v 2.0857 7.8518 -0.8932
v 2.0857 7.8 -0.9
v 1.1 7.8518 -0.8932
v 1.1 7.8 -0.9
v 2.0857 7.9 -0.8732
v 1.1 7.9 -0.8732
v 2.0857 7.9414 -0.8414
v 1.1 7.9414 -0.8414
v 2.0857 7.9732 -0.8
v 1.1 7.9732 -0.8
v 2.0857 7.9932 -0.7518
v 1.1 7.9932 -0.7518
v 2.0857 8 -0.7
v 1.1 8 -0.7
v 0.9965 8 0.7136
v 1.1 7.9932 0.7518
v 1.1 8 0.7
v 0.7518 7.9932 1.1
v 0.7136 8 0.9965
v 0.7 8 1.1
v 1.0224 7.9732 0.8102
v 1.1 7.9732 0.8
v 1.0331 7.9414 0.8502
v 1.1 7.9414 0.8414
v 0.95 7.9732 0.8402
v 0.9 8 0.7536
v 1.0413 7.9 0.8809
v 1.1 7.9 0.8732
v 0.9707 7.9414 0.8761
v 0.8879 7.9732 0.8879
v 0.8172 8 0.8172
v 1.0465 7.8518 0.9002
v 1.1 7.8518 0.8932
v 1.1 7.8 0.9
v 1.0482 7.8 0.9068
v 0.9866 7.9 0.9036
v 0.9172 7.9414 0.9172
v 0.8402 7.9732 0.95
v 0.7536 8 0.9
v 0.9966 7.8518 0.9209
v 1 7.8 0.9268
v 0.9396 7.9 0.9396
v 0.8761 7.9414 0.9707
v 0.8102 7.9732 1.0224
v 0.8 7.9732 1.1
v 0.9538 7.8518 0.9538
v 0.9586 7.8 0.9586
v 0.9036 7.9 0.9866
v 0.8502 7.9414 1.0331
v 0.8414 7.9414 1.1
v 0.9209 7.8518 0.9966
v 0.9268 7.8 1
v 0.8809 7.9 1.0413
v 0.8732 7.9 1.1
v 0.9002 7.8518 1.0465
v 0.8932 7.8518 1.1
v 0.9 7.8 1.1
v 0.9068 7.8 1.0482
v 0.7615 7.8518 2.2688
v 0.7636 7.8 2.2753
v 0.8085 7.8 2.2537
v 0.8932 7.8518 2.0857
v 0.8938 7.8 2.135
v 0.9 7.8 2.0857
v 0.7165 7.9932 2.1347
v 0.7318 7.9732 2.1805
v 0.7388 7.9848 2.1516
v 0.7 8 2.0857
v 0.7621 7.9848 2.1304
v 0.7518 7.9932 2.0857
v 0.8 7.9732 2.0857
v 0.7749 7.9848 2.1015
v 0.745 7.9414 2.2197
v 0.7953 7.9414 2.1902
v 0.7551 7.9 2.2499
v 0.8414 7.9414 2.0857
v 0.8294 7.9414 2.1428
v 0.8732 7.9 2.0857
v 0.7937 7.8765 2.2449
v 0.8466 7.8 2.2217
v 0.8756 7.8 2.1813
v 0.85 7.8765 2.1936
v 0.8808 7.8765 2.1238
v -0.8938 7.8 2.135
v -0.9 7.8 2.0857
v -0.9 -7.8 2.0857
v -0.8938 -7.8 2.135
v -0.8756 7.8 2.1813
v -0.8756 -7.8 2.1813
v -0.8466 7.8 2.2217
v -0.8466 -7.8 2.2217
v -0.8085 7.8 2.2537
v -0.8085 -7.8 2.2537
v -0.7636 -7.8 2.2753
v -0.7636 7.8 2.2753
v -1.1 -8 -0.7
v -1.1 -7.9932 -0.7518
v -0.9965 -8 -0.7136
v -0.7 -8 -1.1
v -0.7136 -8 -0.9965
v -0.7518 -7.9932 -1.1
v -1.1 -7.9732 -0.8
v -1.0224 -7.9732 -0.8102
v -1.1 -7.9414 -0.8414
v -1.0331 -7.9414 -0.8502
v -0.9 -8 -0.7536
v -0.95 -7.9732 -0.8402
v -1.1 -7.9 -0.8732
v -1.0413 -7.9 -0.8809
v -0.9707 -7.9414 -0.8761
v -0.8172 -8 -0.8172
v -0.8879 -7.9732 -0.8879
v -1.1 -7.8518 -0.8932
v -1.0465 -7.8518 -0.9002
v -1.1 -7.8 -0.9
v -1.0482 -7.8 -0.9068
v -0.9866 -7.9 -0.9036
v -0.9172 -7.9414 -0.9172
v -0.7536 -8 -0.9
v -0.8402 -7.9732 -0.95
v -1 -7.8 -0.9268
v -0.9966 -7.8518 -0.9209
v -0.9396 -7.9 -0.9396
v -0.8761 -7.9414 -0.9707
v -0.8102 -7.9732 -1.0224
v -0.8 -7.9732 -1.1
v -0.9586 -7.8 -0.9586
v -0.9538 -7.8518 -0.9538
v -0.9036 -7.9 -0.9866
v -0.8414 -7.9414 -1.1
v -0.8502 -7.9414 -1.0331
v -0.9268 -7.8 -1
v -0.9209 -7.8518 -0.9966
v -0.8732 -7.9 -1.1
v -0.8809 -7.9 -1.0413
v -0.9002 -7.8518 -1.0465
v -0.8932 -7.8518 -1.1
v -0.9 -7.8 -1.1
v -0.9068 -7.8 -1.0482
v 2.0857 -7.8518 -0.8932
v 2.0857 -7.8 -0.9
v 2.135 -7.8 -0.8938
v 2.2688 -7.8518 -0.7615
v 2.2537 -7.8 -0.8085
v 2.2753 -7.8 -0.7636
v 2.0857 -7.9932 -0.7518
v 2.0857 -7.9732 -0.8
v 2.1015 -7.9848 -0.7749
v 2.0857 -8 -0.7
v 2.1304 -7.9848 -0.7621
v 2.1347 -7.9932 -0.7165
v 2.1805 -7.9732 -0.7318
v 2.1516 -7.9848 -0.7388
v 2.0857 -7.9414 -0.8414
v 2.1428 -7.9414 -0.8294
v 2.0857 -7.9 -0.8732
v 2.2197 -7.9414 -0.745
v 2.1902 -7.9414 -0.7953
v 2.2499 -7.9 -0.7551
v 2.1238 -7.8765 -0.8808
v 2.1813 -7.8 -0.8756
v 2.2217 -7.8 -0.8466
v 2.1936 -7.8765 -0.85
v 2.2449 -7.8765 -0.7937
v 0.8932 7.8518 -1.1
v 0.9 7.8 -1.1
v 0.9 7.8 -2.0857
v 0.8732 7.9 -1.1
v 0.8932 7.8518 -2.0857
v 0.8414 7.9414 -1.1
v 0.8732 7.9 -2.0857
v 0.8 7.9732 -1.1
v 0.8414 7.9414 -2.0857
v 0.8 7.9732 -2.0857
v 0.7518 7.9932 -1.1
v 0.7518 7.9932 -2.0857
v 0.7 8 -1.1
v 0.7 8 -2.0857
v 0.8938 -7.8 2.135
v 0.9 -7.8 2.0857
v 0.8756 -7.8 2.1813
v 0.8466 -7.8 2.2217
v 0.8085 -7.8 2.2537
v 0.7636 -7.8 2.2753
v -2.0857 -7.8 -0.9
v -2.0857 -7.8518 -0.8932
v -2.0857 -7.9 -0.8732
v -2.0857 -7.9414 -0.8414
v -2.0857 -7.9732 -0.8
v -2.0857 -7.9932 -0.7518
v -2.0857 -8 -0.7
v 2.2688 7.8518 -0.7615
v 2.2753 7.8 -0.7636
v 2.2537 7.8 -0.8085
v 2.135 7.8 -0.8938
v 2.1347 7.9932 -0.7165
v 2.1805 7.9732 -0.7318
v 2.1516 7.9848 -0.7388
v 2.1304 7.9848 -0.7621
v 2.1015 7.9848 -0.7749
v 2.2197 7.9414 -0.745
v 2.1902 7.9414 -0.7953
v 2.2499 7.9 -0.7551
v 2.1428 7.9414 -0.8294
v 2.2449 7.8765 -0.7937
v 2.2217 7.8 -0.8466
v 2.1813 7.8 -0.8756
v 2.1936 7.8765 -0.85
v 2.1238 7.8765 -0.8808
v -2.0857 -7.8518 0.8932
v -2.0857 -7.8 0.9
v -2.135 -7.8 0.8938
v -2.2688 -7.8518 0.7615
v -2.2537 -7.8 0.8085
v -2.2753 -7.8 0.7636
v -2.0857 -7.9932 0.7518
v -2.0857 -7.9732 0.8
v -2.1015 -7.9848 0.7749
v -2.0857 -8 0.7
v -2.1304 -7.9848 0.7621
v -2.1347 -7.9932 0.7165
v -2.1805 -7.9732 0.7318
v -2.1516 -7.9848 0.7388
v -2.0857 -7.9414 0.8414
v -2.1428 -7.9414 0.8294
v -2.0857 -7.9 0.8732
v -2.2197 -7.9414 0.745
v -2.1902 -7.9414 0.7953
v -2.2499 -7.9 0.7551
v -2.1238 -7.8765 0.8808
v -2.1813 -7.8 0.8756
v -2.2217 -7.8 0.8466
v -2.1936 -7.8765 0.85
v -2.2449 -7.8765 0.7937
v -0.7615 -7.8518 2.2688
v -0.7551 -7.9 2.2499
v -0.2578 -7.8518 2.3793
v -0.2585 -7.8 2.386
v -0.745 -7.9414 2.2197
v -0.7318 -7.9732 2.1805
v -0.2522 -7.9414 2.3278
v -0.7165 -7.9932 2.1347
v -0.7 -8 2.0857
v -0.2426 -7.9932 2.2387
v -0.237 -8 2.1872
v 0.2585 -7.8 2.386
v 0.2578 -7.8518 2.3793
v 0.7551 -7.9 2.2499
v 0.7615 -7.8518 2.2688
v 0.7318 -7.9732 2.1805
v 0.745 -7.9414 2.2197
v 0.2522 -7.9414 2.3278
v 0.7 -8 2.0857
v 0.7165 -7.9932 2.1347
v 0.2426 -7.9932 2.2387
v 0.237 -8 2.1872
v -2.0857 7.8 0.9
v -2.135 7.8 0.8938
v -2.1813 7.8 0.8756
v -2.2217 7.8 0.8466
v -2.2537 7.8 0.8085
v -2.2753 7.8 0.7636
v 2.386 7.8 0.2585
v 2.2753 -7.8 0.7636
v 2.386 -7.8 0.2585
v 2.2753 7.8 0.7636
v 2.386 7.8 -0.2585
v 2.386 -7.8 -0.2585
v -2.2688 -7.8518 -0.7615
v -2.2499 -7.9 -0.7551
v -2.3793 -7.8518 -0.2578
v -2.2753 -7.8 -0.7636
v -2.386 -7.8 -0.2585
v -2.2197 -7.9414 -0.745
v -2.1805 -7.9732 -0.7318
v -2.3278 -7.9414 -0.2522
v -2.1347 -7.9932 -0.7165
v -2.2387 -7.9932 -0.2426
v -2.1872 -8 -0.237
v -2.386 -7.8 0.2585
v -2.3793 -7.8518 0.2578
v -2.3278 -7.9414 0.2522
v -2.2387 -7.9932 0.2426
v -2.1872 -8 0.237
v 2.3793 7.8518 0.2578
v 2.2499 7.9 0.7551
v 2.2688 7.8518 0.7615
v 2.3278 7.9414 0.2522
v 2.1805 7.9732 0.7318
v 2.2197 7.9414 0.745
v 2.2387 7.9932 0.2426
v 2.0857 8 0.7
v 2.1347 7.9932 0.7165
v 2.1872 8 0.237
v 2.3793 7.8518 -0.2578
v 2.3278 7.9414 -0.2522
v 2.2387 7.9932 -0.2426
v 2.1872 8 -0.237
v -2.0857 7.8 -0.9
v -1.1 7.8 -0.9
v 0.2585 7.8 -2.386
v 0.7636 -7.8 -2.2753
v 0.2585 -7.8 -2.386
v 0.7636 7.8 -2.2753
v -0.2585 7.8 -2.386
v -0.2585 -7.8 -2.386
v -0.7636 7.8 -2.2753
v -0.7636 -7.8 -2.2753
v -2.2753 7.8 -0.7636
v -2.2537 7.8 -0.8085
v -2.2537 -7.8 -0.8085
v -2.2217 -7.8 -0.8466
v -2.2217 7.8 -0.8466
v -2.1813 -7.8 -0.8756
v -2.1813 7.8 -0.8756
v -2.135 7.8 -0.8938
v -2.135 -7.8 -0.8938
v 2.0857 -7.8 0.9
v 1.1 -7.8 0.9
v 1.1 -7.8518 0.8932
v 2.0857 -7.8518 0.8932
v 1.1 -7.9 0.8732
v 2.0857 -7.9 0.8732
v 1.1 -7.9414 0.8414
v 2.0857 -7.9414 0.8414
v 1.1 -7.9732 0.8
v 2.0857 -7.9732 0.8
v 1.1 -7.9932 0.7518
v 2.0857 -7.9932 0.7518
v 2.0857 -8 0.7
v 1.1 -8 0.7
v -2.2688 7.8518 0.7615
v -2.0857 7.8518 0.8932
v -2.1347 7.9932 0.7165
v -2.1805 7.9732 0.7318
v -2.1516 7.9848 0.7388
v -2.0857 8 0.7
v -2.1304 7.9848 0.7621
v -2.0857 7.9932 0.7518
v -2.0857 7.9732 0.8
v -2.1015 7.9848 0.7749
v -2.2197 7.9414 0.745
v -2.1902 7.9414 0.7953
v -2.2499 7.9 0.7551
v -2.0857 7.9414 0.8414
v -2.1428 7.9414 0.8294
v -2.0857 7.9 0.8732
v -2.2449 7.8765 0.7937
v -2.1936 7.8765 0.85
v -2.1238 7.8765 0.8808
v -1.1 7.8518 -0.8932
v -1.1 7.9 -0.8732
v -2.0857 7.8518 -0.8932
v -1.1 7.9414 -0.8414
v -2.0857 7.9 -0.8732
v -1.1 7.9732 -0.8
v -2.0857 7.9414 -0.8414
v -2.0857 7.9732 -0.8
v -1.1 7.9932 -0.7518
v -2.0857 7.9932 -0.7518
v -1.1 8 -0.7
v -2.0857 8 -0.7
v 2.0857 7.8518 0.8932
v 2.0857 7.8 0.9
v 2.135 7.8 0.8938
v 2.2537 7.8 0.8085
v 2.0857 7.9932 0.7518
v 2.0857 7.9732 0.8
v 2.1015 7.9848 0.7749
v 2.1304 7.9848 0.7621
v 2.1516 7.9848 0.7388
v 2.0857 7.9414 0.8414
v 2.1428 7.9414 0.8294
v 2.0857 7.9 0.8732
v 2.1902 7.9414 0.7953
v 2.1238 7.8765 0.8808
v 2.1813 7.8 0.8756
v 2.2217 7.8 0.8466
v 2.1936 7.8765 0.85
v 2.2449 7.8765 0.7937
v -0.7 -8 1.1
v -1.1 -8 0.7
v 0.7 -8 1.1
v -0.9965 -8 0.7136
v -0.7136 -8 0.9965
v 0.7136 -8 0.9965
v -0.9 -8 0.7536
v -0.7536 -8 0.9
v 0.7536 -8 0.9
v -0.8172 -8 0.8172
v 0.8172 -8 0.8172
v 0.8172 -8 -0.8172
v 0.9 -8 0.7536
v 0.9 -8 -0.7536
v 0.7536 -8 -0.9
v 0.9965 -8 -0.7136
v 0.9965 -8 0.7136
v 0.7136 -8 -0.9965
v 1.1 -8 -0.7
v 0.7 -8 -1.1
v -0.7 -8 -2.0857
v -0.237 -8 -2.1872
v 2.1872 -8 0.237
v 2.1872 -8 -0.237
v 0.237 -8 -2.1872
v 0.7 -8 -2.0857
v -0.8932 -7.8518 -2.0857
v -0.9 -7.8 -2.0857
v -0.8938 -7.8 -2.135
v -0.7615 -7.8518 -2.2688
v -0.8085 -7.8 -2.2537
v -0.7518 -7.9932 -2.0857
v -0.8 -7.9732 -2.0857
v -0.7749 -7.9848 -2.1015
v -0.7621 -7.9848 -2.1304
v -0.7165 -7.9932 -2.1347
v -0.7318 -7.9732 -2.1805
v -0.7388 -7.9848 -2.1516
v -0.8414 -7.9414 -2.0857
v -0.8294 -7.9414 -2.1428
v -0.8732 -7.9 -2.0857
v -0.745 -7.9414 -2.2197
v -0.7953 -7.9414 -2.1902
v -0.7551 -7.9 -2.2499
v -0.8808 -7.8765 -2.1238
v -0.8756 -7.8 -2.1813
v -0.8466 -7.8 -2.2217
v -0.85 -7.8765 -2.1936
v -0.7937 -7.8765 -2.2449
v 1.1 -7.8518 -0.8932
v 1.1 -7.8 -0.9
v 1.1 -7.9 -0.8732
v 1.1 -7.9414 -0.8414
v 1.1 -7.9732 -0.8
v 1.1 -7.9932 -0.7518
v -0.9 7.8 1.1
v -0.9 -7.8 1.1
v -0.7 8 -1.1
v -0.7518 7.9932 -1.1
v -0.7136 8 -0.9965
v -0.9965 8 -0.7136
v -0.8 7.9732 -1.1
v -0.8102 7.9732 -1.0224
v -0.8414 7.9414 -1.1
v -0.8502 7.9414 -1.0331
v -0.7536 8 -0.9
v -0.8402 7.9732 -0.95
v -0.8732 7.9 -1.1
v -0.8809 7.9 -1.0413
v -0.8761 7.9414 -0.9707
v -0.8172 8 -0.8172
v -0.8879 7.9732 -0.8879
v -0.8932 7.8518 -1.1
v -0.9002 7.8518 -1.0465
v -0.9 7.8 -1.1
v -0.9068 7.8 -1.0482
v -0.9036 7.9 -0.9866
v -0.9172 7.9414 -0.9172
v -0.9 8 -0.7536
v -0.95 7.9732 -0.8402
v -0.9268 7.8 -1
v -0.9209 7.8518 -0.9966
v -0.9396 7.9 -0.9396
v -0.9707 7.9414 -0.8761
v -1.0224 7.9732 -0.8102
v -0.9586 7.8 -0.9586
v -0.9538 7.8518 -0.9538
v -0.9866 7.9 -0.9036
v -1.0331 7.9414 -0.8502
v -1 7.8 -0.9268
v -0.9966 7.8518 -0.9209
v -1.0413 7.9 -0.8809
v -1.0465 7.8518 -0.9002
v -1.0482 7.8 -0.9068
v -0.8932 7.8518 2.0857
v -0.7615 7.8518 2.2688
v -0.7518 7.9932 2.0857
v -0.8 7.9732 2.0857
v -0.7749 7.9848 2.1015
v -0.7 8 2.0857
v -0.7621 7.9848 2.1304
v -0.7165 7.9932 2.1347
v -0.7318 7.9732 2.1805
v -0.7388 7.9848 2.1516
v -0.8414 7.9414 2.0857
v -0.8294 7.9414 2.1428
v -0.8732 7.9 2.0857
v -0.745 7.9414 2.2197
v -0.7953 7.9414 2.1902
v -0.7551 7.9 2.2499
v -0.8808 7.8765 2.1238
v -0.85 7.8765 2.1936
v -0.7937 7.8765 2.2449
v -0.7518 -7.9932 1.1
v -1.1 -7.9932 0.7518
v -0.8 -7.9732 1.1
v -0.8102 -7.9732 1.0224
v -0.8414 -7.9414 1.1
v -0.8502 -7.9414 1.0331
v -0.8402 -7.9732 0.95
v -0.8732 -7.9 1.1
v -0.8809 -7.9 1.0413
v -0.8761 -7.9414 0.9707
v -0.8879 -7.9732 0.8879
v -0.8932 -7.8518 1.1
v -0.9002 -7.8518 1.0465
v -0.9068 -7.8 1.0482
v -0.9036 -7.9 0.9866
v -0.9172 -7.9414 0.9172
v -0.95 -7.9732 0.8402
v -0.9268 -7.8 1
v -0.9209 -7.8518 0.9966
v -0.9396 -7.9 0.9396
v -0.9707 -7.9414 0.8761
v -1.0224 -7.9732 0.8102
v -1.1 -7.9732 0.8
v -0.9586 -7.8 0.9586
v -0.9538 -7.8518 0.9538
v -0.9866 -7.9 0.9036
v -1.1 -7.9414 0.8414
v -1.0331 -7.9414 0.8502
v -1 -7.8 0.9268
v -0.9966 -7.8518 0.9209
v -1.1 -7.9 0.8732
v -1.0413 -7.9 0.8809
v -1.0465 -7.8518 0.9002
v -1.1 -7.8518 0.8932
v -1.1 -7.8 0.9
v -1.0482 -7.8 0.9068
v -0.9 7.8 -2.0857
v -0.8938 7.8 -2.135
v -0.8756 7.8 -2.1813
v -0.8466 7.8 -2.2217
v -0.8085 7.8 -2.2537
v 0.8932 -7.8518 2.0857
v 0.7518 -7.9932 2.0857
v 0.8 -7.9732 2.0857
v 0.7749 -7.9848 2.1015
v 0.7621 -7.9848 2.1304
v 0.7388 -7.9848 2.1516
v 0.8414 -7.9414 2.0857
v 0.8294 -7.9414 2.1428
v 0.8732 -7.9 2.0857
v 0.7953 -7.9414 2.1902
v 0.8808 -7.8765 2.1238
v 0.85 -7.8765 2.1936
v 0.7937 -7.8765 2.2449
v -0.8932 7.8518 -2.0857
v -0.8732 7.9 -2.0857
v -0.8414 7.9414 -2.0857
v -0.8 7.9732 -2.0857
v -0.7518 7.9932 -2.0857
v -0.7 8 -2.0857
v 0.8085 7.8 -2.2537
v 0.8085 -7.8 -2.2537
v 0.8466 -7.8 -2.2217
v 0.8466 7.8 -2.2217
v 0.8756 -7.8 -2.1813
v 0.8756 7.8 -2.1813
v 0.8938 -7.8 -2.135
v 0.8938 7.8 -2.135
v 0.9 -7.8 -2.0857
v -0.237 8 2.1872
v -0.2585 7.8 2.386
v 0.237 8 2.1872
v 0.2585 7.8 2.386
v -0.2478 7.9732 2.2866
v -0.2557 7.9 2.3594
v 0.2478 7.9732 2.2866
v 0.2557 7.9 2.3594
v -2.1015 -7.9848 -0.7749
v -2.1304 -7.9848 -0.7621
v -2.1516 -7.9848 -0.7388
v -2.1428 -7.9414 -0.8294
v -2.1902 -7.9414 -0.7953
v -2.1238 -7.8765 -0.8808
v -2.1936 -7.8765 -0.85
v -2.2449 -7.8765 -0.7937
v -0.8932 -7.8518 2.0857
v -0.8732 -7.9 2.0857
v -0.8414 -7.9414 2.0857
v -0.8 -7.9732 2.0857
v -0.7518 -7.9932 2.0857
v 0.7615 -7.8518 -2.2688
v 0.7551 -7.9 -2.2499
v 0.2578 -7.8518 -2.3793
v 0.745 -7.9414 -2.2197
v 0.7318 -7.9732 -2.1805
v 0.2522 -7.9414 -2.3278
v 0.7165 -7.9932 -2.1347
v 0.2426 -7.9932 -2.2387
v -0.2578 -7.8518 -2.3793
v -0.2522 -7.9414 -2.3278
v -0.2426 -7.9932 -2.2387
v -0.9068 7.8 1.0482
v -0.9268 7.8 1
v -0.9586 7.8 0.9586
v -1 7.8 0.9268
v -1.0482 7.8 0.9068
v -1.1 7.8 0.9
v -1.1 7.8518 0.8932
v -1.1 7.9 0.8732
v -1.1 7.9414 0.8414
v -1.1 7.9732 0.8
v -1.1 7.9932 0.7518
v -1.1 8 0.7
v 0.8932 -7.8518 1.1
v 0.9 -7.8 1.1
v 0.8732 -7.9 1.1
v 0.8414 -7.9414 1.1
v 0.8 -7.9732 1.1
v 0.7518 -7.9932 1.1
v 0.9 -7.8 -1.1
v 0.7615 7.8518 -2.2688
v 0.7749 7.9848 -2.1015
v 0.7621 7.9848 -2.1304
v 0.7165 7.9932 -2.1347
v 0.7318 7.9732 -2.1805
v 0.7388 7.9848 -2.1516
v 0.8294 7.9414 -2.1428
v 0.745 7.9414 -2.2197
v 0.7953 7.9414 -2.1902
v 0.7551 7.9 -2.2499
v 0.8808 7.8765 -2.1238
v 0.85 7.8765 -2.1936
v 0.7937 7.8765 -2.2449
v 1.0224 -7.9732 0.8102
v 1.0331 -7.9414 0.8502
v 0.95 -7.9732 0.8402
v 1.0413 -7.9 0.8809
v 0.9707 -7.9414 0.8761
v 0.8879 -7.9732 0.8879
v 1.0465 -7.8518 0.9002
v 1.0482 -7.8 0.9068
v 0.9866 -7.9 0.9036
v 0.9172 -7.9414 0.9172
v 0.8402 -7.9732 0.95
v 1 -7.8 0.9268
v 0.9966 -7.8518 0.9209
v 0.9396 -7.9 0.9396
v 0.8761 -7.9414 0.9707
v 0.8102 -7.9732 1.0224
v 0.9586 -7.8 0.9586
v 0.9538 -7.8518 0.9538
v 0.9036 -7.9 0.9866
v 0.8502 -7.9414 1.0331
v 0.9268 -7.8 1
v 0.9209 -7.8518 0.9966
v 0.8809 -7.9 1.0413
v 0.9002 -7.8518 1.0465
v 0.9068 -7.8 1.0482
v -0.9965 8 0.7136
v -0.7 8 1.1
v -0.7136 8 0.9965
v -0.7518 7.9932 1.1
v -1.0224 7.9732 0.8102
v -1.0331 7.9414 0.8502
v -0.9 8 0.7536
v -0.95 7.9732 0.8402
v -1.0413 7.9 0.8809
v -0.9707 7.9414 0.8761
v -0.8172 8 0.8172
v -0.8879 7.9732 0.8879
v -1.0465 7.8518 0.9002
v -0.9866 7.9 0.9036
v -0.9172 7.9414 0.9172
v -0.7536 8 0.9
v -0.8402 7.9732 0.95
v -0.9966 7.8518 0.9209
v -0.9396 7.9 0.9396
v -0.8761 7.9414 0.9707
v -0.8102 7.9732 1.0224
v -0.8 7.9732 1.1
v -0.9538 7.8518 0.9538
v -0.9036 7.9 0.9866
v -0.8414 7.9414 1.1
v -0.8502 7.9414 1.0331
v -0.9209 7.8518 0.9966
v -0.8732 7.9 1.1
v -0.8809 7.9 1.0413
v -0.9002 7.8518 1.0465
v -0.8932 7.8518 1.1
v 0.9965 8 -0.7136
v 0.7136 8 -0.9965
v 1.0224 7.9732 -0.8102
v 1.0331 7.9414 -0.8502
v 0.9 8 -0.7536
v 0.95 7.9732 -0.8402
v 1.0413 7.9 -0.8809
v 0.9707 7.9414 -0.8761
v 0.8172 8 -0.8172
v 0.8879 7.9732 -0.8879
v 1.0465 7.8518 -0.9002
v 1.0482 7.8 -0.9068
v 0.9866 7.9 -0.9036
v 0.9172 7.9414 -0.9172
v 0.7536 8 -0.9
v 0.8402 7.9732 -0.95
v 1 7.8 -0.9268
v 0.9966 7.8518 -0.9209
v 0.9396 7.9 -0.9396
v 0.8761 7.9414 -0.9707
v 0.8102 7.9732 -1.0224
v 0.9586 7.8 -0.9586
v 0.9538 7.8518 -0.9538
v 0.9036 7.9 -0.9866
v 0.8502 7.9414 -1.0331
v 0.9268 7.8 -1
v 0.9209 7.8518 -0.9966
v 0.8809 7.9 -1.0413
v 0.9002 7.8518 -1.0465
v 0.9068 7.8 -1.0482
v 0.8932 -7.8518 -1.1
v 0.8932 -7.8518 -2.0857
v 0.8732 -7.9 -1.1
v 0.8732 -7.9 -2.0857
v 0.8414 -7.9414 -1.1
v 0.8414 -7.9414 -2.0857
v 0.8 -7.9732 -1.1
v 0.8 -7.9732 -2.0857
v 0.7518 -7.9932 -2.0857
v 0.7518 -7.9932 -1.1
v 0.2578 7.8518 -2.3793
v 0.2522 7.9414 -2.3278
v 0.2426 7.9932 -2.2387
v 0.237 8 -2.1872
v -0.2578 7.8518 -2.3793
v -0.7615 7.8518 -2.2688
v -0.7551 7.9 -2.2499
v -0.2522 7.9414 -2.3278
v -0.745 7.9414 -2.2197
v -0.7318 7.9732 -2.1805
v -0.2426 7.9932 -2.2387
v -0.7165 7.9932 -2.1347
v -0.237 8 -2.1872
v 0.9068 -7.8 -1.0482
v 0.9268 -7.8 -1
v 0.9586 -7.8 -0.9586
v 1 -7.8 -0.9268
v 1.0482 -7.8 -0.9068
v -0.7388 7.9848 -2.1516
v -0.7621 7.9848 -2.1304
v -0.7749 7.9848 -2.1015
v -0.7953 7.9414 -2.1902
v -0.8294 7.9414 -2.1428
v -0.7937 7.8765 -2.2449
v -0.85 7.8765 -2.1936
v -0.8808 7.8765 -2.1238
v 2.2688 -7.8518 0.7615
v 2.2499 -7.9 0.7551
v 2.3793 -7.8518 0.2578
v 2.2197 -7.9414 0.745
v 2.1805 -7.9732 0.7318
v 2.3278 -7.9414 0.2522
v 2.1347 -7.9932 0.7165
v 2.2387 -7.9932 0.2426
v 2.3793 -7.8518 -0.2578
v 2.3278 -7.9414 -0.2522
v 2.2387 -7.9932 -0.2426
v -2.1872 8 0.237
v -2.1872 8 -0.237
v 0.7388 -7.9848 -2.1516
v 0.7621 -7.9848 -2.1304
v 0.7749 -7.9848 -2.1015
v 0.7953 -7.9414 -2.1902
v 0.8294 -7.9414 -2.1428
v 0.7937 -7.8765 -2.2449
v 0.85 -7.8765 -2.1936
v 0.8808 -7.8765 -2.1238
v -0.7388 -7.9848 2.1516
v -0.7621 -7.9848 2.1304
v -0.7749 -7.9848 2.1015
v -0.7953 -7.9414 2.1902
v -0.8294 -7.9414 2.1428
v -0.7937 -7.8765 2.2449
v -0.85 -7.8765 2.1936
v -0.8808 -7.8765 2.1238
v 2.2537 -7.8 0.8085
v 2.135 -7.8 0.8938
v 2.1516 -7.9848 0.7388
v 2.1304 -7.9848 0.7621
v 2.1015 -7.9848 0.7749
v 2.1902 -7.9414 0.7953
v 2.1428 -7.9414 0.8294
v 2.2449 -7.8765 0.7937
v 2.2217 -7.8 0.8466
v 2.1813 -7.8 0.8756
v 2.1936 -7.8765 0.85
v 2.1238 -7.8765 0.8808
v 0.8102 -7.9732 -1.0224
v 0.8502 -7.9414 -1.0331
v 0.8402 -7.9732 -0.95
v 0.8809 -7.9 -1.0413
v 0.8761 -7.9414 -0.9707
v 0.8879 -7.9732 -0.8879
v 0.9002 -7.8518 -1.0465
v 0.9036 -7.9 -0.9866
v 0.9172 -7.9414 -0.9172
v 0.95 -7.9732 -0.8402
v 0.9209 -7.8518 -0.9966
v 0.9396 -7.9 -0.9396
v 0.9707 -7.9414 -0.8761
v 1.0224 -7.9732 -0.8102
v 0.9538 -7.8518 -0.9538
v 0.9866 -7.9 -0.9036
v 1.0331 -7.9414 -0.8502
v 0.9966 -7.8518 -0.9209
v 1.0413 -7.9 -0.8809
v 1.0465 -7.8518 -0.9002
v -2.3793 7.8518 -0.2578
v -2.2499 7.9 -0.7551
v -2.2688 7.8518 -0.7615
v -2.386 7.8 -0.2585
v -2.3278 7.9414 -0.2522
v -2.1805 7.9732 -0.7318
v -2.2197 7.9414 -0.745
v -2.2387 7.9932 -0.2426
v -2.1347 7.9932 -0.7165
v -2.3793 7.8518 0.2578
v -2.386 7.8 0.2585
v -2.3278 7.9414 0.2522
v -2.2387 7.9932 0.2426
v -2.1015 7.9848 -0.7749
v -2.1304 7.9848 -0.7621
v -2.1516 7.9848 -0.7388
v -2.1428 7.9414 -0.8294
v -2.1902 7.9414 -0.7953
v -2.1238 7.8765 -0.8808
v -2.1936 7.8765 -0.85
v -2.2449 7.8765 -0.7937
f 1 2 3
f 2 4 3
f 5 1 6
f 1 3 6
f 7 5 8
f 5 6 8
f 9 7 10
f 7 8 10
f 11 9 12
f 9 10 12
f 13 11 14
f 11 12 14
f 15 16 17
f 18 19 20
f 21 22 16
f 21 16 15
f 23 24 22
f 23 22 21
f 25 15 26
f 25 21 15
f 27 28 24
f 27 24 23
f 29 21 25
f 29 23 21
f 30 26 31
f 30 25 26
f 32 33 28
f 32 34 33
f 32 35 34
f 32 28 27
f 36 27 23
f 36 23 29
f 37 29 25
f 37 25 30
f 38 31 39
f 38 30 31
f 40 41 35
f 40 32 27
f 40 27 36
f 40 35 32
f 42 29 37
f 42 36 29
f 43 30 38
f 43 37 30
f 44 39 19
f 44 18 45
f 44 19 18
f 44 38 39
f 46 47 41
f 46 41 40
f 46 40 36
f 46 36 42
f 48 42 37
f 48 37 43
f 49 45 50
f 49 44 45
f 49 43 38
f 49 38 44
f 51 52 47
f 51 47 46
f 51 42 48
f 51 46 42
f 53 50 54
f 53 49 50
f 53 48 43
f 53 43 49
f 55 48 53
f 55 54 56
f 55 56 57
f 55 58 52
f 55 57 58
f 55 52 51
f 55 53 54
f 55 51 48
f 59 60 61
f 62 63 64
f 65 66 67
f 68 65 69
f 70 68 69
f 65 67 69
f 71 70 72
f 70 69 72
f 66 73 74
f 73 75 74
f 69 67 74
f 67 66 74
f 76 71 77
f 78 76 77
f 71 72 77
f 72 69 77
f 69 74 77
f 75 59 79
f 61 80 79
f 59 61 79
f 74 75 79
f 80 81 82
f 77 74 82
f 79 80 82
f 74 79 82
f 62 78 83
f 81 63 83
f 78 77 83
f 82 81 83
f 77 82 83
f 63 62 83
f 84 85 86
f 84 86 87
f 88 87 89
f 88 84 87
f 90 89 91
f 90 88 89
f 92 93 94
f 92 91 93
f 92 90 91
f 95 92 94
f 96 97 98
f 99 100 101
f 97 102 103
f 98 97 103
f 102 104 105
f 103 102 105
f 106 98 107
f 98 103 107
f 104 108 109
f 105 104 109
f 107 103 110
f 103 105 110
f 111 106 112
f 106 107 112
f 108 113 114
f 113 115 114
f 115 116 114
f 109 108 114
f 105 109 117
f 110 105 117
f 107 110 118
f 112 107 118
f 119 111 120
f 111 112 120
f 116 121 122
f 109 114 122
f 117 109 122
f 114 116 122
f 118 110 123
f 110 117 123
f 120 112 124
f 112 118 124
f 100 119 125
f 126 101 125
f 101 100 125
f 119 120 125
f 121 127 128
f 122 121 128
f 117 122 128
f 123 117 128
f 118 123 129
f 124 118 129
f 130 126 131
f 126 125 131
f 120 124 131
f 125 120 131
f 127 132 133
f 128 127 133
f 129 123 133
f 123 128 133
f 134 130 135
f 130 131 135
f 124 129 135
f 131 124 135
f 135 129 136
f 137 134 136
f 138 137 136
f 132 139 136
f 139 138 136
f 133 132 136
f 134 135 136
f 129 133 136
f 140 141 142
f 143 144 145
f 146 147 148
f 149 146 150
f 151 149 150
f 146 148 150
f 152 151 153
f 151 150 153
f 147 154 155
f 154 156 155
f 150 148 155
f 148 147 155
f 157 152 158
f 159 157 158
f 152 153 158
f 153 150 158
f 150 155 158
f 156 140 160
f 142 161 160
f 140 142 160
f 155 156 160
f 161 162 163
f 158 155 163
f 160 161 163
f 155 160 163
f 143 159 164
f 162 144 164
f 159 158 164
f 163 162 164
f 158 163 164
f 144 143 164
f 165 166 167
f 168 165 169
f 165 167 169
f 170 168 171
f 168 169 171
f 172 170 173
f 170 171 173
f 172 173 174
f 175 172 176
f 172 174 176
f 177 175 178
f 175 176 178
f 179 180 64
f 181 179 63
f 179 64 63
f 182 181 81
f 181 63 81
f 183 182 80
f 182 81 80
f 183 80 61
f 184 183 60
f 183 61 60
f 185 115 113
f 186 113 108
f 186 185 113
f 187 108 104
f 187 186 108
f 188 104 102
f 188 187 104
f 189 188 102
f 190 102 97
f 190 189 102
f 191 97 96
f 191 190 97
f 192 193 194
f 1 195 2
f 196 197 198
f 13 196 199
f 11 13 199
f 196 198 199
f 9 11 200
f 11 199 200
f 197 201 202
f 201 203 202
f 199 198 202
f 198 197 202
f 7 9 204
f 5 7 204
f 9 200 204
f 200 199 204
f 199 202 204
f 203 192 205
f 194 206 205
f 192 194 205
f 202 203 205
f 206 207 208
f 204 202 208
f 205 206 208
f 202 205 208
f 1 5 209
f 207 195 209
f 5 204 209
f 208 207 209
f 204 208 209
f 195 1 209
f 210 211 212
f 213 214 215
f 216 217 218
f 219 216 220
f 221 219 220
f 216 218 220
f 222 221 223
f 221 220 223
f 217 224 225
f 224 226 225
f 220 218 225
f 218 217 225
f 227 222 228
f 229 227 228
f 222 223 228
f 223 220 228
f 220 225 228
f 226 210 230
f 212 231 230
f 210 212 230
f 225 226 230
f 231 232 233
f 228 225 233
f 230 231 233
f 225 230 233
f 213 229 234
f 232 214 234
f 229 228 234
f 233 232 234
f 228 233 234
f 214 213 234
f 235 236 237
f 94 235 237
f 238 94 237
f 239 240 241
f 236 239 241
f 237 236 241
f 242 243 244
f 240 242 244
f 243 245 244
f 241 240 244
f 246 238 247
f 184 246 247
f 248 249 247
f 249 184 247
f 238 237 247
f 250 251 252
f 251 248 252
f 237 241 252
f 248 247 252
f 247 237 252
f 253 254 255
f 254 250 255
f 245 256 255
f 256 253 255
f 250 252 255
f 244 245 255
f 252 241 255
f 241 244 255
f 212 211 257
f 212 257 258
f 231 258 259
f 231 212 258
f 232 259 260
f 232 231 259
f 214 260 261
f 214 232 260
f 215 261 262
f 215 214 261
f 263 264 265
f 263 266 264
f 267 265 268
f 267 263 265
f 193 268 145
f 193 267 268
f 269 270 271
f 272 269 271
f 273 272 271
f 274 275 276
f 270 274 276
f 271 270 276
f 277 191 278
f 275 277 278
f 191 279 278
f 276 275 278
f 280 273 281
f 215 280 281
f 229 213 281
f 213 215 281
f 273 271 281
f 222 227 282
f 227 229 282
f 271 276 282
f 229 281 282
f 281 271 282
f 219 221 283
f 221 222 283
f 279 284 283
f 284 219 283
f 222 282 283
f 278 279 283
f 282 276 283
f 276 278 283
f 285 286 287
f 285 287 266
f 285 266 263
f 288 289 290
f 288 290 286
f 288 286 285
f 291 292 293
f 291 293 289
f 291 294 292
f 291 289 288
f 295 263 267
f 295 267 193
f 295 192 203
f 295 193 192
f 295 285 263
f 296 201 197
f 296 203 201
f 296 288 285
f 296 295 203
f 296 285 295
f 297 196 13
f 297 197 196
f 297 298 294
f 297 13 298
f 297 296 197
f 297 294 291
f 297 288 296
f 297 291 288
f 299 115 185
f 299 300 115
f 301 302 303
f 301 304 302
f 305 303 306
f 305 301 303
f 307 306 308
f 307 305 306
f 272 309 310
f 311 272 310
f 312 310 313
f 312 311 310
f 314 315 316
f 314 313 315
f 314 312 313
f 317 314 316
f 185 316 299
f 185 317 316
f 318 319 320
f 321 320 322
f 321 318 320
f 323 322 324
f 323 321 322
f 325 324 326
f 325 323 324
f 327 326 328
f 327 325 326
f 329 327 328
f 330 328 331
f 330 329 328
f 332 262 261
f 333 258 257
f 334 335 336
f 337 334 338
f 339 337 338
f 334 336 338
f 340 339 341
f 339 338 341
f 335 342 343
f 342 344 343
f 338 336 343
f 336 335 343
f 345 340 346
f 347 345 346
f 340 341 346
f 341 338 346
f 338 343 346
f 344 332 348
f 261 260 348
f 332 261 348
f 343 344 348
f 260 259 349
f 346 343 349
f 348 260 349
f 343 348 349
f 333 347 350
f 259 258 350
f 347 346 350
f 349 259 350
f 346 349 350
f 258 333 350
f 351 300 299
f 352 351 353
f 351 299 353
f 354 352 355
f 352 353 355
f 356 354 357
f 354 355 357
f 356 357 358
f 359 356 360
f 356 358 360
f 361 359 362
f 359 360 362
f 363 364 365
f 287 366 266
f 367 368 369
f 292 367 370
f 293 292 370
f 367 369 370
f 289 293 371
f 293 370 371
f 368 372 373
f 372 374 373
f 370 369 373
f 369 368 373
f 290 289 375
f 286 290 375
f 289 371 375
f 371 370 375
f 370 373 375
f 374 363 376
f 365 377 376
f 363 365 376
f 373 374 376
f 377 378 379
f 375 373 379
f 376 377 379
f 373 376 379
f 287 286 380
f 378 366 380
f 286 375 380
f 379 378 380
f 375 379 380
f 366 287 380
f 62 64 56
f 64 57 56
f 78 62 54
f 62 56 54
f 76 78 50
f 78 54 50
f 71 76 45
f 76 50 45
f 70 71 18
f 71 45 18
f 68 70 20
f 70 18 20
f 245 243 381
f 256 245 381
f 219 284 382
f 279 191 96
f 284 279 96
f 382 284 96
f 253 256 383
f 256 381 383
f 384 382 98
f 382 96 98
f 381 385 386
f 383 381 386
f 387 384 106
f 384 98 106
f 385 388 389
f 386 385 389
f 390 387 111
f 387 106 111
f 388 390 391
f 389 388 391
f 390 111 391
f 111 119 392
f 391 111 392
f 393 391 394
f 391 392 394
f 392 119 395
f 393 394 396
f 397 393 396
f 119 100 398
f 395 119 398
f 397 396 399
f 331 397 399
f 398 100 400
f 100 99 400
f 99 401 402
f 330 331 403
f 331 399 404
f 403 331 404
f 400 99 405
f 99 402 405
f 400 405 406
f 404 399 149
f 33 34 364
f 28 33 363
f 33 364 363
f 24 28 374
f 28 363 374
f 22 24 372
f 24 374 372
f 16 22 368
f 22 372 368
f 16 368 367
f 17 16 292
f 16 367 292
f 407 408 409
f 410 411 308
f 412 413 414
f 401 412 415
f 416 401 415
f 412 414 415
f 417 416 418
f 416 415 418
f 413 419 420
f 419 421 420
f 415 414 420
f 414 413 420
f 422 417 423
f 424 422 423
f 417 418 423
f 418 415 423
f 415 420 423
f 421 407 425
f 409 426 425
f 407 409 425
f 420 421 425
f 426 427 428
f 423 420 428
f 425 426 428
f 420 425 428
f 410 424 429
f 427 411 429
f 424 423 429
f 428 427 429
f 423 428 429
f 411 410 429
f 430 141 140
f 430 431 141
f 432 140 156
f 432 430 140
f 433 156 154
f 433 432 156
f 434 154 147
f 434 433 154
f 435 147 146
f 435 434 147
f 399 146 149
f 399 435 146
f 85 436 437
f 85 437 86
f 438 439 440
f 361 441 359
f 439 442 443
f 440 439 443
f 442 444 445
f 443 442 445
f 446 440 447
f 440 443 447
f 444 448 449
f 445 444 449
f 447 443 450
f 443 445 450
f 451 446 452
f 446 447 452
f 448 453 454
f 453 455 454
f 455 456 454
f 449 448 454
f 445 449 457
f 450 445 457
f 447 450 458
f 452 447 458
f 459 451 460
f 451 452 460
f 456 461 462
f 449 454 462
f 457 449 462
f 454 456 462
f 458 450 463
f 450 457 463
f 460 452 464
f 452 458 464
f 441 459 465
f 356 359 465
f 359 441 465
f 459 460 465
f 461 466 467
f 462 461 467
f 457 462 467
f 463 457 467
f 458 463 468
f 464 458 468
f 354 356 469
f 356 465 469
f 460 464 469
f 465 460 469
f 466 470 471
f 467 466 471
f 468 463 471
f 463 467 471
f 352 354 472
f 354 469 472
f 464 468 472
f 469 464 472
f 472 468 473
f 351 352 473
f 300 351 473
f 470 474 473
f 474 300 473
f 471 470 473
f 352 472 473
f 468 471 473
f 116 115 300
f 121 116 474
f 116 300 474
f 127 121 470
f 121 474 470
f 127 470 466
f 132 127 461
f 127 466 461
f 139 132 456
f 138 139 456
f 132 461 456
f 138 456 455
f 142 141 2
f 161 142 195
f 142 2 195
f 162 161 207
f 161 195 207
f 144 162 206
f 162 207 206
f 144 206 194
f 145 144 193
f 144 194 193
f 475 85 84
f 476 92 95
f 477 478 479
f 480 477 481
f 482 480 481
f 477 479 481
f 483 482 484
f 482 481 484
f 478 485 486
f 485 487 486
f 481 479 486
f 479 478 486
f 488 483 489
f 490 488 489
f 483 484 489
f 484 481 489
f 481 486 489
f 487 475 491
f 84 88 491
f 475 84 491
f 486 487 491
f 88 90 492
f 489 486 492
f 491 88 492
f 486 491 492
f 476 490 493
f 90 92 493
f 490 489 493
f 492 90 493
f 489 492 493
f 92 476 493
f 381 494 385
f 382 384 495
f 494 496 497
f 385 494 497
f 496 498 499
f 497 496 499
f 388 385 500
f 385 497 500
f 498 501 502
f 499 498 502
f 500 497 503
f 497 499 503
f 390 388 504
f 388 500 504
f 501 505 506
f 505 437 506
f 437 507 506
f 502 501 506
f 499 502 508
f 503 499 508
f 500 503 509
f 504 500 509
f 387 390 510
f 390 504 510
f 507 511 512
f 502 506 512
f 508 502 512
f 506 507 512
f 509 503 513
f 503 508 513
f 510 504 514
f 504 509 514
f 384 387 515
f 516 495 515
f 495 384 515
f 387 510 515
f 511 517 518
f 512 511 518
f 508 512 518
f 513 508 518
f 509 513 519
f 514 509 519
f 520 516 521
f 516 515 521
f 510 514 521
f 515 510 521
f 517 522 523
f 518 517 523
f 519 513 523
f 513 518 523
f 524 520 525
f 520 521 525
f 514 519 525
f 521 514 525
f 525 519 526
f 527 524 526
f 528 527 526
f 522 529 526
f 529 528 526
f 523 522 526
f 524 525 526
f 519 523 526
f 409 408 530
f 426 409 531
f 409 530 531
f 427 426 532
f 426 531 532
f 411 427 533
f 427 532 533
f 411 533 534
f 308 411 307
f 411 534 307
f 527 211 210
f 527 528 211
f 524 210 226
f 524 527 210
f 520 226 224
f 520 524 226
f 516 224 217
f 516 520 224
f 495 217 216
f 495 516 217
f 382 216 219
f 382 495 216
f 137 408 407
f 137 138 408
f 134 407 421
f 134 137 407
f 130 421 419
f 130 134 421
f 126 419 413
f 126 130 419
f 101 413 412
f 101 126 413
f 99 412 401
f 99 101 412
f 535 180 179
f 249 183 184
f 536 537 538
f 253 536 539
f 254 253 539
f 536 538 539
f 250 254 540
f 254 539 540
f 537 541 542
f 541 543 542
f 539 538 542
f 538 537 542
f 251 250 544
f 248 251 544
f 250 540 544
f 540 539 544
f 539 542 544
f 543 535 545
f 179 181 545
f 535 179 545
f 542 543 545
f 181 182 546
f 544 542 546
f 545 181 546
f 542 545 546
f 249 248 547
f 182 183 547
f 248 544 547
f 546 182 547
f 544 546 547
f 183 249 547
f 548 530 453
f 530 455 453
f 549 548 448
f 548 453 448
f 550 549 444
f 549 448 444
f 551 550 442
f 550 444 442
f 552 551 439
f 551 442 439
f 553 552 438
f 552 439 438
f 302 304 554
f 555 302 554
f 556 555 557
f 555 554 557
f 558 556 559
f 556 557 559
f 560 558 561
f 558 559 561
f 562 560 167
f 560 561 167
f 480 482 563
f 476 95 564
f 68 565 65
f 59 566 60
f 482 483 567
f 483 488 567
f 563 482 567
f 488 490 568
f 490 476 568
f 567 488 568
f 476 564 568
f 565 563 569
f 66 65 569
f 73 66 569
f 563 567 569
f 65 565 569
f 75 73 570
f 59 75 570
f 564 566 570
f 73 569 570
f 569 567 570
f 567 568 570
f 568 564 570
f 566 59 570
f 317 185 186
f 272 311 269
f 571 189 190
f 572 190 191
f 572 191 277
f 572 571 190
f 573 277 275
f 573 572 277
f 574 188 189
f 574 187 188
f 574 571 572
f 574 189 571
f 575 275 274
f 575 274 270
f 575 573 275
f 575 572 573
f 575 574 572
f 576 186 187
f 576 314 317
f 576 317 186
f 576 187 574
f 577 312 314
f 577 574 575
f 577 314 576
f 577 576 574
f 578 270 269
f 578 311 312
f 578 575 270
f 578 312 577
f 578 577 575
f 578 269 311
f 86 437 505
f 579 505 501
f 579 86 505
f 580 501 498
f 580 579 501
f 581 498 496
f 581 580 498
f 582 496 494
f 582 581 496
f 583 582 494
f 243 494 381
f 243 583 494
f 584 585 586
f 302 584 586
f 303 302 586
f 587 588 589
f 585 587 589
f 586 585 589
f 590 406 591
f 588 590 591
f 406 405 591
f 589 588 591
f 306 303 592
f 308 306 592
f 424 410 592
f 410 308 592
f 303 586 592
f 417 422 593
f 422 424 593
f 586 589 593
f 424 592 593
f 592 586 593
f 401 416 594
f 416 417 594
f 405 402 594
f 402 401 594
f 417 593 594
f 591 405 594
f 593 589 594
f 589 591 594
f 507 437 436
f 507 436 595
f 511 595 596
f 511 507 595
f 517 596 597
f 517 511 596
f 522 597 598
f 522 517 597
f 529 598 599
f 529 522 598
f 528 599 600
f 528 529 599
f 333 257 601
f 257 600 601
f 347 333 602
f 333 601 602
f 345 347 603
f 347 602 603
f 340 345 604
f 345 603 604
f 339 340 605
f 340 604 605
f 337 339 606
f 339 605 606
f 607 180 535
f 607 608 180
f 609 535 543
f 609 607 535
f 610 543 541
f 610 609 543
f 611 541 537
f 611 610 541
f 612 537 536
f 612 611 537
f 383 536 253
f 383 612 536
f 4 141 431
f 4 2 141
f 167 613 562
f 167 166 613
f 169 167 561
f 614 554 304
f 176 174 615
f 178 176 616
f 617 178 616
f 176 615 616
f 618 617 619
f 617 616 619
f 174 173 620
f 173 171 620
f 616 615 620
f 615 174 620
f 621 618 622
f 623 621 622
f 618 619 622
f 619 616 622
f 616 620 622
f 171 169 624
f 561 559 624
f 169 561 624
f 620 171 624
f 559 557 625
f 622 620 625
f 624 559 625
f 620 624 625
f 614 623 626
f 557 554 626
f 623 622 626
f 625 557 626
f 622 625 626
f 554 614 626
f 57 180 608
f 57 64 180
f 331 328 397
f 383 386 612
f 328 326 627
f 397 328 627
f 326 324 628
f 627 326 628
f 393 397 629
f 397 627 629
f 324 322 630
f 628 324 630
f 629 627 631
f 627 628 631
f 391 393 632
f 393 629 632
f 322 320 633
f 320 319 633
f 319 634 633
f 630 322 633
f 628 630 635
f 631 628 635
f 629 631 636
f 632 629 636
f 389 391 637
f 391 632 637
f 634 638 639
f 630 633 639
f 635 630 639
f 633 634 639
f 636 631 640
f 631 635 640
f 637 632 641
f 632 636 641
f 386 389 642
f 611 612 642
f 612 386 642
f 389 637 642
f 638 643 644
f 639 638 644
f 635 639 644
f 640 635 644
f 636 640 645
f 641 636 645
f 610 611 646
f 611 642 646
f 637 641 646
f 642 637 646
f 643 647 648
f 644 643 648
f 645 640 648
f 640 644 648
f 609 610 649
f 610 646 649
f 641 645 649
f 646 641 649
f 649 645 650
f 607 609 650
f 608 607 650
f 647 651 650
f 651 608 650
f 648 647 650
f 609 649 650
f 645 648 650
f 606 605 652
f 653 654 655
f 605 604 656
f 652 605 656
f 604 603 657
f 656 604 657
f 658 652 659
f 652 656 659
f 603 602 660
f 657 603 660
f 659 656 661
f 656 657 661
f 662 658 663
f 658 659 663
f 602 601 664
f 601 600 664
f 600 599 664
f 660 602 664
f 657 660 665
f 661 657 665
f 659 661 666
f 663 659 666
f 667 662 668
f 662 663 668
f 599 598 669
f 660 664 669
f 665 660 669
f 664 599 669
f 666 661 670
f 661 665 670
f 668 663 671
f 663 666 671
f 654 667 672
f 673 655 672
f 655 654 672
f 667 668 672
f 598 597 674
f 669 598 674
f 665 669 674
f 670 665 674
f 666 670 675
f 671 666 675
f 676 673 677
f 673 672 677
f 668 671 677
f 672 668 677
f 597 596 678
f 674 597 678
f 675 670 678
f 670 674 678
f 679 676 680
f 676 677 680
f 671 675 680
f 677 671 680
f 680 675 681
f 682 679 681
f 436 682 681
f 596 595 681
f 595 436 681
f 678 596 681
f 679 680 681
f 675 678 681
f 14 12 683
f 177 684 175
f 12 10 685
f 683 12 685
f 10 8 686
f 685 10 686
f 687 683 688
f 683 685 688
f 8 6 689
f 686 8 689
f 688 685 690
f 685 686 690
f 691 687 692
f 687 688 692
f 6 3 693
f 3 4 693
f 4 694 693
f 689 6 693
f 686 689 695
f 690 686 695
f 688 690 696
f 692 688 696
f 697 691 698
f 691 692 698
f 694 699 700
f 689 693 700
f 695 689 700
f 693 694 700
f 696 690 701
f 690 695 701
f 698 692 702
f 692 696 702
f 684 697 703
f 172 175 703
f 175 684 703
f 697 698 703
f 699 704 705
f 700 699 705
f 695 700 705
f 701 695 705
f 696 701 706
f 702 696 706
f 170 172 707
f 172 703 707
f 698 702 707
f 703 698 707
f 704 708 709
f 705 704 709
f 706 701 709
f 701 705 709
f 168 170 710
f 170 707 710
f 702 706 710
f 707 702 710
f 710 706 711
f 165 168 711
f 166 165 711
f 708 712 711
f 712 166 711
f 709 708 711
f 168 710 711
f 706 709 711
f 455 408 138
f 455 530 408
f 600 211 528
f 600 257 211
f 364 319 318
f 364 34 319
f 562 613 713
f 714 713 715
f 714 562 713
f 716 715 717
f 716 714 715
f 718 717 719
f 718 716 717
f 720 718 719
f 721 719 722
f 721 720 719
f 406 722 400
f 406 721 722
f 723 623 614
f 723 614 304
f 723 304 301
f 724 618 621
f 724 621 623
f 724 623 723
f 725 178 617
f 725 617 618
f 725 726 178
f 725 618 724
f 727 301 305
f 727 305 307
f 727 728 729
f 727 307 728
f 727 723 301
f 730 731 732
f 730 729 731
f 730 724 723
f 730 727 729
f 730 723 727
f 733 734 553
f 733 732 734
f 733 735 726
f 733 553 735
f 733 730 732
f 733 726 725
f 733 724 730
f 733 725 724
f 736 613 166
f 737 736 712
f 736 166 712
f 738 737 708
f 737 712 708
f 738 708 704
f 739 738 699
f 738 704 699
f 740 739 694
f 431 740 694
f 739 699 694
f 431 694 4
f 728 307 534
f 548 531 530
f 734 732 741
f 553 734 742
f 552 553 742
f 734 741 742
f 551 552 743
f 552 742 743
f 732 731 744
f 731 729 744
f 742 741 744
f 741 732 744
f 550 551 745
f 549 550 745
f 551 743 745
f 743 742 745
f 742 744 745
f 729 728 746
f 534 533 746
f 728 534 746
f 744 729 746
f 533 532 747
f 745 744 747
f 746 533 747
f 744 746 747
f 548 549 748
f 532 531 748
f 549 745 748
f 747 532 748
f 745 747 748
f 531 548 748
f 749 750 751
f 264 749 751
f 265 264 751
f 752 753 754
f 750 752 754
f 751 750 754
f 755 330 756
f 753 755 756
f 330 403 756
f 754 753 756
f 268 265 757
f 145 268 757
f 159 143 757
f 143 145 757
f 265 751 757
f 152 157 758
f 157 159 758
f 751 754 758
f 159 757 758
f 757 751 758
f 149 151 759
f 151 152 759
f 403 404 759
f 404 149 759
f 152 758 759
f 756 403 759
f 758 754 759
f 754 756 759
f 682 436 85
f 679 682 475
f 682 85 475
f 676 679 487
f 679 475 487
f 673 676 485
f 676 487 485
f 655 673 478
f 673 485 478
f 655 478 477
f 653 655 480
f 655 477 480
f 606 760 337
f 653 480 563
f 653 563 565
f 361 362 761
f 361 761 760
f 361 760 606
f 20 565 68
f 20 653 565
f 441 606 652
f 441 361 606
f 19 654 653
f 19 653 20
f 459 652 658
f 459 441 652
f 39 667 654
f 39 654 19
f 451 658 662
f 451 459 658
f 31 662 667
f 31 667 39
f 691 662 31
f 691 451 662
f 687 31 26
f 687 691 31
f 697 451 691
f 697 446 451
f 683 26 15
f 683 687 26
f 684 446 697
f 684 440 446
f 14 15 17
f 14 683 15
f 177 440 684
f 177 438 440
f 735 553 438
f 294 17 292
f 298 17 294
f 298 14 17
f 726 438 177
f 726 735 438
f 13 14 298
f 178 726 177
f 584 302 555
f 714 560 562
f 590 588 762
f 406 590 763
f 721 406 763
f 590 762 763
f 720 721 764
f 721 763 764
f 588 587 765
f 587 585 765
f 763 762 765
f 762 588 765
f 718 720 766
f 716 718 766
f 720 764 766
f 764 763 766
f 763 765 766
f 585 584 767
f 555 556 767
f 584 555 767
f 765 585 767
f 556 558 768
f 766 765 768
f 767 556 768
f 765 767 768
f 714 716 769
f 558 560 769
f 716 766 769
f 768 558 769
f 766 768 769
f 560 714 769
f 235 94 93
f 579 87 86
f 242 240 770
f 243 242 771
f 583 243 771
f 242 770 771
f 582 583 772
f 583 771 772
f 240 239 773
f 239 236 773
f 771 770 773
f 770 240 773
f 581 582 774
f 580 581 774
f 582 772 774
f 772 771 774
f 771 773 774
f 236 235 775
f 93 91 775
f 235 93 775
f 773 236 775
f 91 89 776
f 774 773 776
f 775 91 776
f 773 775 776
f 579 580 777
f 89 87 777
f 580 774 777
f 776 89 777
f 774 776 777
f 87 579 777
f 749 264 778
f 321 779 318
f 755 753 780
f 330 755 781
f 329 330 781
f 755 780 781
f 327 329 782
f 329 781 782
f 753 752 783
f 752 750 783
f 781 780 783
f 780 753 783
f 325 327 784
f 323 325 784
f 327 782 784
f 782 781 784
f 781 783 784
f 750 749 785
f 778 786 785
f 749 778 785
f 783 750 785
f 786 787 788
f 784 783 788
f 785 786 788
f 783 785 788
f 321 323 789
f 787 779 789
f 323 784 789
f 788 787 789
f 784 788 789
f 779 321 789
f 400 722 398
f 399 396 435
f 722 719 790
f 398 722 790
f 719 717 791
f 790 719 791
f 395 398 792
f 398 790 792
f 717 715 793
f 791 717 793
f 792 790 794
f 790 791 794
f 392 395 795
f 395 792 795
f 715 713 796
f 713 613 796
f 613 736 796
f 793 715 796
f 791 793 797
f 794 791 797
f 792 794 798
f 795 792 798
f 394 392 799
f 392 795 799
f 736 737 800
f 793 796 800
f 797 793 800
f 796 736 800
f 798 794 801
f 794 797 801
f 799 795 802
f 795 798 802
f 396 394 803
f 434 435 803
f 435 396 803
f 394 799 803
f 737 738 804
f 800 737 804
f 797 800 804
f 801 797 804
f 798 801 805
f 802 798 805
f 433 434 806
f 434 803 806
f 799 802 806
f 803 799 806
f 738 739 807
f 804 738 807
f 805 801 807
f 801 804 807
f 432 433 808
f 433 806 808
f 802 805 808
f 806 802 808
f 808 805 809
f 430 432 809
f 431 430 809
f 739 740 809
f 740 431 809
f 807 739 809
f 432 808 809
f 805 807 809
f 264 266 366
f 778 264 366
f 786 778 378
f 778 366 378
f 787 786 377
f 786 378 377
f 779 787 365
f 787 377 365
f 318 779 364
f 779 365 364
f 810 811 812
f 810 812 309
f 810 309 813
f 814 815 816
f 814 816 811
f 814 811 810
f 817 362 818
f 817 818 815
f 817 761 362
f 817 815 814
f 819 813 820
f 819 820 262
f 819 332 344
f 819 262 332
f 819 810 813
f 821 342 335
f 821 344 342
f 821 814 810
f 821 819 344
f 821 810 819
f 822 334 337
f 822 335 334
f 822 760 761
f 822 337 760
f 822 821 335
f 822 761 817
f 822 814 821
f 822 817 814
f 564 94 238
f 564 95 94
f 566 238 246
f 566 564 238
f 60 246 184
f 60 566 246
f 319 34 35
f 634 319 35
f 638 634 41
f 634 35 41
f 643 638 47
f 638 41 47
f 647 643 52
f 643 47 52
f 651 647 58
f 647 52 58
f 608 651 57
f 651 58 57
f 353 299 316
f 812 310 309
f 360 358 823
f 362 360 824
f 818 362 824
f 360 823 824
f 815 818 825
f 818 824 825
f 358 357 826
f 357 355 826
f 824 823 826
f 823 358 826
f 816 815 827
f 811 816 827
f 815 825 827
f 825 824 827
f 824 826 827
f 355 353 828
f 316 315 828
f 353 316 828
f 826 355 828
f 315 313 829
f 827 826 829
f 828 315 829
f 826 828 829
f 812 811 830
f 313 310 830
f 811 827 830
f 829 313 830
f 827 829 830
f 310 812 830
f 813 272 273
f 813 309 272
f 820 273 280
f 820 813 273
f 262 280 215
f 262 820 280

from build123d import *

# Parameters (mm, degrees)
BOSS_EXTRUDE1_DEPTH = 8
FILLET3_R           = 0.2


with BuildPart() as part:
    # Sketch1 → Boss-Extrude1 (new, symmetric)
    with BuildSketch(Plane(origin=(0, 0, 0), x_dir=(1, 0, 0), z_dir=(0, 1, 0))):
        with BuildLine():
            Line((-0.9, -0.9), (-0.9, -2.224859546))
            ThreePointArc((-0.9, -2.224859546), (0, -2.4), (0.9, -2.224859546))
            Line((0.9, -2.224859546), (0.9, -0.9))
            Line((0.9, -0.9), (2.224859546, -0.9))
            ThreePointArc((2.224859546, -0.9), (2.4, 0), (2.224859546, 0.9))
            Line((2.224859546, 0.9), (0.9, 0.9))
            Line((0.9, 0.9), (0.9, 2.224859546))
            ThreePointArc((0.9, 2.224859546), (0, 2.4), (-0.9, 2.224859546))
            Line((-0.9, 2.224859546), (-0.9, 0.9))
            Line((-0.9, 0.9), (-2.224859546, 0.9))
            ThreePointArc((-2.224859546, 0.9), (-2.4, 0), (-2.224859546, -0.9))
            Line((-2.224859546, -0.9), (-0.9, -0.9))
        make_face()
    extrude(amount=BOSS_EXTRUDE1_DEPTH, both=True)

    # Fillet3
    fillet3_edges = [part.edges().sort_by_distance(p)[0] for p in [
        (-1.562429773, -8, -0.9),
        (-0.9, -8, -1.562429773),
        (-0.9, 8, 1.562429773),
        (0, -8, -2.4),
        (0.9, -8, -1.562429773),
        (1.562429773, -8, -0.9),
        (2.4, -8, 0),
        (1.562429773, -8, 0.9),
        (0.9, -8, 1.562429773),
        (0, -8, 2.4),
        (-0.9, -8, 1.562429773),
        (-1.562429773, -8, 0.9),
        (-2.4, -8, 0),
        (0, 8, 2.4),
        (-2.224859546, 0, -0.9),
        (-0.9, 0, -0.9),
        (-0.9, 0, -2.224859546),
        (0.9, 8, 1.562429773),
        (0.9, 0, -2.224859546),
        (0.9, 0, -0.9),
        (2.224859546, 0, -0.9),
        (2.224859546, 0, 0.9),
        (0.9, 0, 0.9),
        (0.9, 0, 2.224859546),
        (-0.9, 0, 2.224859546),
        (-0.9, 0, 0.9),
        (-2.224859546, 0, 0.9),
        (1.562429773, 8, 0.9),
        (2.4, 8, 0),
        (1.562429773, 8, -0.9),
        (0.9, 8, -1.562429773),
        (0, 8, -2.4),
        (-0.9, 8, -1.562429773),
        (-1.562429773, 8, -0.9),
        (-2.4, 8, 0),
        (-1.562429773, 8, 0.9),
    ]]
    fillet(fillet3_edges, radius=FILLET3_R)


solid = part.part
